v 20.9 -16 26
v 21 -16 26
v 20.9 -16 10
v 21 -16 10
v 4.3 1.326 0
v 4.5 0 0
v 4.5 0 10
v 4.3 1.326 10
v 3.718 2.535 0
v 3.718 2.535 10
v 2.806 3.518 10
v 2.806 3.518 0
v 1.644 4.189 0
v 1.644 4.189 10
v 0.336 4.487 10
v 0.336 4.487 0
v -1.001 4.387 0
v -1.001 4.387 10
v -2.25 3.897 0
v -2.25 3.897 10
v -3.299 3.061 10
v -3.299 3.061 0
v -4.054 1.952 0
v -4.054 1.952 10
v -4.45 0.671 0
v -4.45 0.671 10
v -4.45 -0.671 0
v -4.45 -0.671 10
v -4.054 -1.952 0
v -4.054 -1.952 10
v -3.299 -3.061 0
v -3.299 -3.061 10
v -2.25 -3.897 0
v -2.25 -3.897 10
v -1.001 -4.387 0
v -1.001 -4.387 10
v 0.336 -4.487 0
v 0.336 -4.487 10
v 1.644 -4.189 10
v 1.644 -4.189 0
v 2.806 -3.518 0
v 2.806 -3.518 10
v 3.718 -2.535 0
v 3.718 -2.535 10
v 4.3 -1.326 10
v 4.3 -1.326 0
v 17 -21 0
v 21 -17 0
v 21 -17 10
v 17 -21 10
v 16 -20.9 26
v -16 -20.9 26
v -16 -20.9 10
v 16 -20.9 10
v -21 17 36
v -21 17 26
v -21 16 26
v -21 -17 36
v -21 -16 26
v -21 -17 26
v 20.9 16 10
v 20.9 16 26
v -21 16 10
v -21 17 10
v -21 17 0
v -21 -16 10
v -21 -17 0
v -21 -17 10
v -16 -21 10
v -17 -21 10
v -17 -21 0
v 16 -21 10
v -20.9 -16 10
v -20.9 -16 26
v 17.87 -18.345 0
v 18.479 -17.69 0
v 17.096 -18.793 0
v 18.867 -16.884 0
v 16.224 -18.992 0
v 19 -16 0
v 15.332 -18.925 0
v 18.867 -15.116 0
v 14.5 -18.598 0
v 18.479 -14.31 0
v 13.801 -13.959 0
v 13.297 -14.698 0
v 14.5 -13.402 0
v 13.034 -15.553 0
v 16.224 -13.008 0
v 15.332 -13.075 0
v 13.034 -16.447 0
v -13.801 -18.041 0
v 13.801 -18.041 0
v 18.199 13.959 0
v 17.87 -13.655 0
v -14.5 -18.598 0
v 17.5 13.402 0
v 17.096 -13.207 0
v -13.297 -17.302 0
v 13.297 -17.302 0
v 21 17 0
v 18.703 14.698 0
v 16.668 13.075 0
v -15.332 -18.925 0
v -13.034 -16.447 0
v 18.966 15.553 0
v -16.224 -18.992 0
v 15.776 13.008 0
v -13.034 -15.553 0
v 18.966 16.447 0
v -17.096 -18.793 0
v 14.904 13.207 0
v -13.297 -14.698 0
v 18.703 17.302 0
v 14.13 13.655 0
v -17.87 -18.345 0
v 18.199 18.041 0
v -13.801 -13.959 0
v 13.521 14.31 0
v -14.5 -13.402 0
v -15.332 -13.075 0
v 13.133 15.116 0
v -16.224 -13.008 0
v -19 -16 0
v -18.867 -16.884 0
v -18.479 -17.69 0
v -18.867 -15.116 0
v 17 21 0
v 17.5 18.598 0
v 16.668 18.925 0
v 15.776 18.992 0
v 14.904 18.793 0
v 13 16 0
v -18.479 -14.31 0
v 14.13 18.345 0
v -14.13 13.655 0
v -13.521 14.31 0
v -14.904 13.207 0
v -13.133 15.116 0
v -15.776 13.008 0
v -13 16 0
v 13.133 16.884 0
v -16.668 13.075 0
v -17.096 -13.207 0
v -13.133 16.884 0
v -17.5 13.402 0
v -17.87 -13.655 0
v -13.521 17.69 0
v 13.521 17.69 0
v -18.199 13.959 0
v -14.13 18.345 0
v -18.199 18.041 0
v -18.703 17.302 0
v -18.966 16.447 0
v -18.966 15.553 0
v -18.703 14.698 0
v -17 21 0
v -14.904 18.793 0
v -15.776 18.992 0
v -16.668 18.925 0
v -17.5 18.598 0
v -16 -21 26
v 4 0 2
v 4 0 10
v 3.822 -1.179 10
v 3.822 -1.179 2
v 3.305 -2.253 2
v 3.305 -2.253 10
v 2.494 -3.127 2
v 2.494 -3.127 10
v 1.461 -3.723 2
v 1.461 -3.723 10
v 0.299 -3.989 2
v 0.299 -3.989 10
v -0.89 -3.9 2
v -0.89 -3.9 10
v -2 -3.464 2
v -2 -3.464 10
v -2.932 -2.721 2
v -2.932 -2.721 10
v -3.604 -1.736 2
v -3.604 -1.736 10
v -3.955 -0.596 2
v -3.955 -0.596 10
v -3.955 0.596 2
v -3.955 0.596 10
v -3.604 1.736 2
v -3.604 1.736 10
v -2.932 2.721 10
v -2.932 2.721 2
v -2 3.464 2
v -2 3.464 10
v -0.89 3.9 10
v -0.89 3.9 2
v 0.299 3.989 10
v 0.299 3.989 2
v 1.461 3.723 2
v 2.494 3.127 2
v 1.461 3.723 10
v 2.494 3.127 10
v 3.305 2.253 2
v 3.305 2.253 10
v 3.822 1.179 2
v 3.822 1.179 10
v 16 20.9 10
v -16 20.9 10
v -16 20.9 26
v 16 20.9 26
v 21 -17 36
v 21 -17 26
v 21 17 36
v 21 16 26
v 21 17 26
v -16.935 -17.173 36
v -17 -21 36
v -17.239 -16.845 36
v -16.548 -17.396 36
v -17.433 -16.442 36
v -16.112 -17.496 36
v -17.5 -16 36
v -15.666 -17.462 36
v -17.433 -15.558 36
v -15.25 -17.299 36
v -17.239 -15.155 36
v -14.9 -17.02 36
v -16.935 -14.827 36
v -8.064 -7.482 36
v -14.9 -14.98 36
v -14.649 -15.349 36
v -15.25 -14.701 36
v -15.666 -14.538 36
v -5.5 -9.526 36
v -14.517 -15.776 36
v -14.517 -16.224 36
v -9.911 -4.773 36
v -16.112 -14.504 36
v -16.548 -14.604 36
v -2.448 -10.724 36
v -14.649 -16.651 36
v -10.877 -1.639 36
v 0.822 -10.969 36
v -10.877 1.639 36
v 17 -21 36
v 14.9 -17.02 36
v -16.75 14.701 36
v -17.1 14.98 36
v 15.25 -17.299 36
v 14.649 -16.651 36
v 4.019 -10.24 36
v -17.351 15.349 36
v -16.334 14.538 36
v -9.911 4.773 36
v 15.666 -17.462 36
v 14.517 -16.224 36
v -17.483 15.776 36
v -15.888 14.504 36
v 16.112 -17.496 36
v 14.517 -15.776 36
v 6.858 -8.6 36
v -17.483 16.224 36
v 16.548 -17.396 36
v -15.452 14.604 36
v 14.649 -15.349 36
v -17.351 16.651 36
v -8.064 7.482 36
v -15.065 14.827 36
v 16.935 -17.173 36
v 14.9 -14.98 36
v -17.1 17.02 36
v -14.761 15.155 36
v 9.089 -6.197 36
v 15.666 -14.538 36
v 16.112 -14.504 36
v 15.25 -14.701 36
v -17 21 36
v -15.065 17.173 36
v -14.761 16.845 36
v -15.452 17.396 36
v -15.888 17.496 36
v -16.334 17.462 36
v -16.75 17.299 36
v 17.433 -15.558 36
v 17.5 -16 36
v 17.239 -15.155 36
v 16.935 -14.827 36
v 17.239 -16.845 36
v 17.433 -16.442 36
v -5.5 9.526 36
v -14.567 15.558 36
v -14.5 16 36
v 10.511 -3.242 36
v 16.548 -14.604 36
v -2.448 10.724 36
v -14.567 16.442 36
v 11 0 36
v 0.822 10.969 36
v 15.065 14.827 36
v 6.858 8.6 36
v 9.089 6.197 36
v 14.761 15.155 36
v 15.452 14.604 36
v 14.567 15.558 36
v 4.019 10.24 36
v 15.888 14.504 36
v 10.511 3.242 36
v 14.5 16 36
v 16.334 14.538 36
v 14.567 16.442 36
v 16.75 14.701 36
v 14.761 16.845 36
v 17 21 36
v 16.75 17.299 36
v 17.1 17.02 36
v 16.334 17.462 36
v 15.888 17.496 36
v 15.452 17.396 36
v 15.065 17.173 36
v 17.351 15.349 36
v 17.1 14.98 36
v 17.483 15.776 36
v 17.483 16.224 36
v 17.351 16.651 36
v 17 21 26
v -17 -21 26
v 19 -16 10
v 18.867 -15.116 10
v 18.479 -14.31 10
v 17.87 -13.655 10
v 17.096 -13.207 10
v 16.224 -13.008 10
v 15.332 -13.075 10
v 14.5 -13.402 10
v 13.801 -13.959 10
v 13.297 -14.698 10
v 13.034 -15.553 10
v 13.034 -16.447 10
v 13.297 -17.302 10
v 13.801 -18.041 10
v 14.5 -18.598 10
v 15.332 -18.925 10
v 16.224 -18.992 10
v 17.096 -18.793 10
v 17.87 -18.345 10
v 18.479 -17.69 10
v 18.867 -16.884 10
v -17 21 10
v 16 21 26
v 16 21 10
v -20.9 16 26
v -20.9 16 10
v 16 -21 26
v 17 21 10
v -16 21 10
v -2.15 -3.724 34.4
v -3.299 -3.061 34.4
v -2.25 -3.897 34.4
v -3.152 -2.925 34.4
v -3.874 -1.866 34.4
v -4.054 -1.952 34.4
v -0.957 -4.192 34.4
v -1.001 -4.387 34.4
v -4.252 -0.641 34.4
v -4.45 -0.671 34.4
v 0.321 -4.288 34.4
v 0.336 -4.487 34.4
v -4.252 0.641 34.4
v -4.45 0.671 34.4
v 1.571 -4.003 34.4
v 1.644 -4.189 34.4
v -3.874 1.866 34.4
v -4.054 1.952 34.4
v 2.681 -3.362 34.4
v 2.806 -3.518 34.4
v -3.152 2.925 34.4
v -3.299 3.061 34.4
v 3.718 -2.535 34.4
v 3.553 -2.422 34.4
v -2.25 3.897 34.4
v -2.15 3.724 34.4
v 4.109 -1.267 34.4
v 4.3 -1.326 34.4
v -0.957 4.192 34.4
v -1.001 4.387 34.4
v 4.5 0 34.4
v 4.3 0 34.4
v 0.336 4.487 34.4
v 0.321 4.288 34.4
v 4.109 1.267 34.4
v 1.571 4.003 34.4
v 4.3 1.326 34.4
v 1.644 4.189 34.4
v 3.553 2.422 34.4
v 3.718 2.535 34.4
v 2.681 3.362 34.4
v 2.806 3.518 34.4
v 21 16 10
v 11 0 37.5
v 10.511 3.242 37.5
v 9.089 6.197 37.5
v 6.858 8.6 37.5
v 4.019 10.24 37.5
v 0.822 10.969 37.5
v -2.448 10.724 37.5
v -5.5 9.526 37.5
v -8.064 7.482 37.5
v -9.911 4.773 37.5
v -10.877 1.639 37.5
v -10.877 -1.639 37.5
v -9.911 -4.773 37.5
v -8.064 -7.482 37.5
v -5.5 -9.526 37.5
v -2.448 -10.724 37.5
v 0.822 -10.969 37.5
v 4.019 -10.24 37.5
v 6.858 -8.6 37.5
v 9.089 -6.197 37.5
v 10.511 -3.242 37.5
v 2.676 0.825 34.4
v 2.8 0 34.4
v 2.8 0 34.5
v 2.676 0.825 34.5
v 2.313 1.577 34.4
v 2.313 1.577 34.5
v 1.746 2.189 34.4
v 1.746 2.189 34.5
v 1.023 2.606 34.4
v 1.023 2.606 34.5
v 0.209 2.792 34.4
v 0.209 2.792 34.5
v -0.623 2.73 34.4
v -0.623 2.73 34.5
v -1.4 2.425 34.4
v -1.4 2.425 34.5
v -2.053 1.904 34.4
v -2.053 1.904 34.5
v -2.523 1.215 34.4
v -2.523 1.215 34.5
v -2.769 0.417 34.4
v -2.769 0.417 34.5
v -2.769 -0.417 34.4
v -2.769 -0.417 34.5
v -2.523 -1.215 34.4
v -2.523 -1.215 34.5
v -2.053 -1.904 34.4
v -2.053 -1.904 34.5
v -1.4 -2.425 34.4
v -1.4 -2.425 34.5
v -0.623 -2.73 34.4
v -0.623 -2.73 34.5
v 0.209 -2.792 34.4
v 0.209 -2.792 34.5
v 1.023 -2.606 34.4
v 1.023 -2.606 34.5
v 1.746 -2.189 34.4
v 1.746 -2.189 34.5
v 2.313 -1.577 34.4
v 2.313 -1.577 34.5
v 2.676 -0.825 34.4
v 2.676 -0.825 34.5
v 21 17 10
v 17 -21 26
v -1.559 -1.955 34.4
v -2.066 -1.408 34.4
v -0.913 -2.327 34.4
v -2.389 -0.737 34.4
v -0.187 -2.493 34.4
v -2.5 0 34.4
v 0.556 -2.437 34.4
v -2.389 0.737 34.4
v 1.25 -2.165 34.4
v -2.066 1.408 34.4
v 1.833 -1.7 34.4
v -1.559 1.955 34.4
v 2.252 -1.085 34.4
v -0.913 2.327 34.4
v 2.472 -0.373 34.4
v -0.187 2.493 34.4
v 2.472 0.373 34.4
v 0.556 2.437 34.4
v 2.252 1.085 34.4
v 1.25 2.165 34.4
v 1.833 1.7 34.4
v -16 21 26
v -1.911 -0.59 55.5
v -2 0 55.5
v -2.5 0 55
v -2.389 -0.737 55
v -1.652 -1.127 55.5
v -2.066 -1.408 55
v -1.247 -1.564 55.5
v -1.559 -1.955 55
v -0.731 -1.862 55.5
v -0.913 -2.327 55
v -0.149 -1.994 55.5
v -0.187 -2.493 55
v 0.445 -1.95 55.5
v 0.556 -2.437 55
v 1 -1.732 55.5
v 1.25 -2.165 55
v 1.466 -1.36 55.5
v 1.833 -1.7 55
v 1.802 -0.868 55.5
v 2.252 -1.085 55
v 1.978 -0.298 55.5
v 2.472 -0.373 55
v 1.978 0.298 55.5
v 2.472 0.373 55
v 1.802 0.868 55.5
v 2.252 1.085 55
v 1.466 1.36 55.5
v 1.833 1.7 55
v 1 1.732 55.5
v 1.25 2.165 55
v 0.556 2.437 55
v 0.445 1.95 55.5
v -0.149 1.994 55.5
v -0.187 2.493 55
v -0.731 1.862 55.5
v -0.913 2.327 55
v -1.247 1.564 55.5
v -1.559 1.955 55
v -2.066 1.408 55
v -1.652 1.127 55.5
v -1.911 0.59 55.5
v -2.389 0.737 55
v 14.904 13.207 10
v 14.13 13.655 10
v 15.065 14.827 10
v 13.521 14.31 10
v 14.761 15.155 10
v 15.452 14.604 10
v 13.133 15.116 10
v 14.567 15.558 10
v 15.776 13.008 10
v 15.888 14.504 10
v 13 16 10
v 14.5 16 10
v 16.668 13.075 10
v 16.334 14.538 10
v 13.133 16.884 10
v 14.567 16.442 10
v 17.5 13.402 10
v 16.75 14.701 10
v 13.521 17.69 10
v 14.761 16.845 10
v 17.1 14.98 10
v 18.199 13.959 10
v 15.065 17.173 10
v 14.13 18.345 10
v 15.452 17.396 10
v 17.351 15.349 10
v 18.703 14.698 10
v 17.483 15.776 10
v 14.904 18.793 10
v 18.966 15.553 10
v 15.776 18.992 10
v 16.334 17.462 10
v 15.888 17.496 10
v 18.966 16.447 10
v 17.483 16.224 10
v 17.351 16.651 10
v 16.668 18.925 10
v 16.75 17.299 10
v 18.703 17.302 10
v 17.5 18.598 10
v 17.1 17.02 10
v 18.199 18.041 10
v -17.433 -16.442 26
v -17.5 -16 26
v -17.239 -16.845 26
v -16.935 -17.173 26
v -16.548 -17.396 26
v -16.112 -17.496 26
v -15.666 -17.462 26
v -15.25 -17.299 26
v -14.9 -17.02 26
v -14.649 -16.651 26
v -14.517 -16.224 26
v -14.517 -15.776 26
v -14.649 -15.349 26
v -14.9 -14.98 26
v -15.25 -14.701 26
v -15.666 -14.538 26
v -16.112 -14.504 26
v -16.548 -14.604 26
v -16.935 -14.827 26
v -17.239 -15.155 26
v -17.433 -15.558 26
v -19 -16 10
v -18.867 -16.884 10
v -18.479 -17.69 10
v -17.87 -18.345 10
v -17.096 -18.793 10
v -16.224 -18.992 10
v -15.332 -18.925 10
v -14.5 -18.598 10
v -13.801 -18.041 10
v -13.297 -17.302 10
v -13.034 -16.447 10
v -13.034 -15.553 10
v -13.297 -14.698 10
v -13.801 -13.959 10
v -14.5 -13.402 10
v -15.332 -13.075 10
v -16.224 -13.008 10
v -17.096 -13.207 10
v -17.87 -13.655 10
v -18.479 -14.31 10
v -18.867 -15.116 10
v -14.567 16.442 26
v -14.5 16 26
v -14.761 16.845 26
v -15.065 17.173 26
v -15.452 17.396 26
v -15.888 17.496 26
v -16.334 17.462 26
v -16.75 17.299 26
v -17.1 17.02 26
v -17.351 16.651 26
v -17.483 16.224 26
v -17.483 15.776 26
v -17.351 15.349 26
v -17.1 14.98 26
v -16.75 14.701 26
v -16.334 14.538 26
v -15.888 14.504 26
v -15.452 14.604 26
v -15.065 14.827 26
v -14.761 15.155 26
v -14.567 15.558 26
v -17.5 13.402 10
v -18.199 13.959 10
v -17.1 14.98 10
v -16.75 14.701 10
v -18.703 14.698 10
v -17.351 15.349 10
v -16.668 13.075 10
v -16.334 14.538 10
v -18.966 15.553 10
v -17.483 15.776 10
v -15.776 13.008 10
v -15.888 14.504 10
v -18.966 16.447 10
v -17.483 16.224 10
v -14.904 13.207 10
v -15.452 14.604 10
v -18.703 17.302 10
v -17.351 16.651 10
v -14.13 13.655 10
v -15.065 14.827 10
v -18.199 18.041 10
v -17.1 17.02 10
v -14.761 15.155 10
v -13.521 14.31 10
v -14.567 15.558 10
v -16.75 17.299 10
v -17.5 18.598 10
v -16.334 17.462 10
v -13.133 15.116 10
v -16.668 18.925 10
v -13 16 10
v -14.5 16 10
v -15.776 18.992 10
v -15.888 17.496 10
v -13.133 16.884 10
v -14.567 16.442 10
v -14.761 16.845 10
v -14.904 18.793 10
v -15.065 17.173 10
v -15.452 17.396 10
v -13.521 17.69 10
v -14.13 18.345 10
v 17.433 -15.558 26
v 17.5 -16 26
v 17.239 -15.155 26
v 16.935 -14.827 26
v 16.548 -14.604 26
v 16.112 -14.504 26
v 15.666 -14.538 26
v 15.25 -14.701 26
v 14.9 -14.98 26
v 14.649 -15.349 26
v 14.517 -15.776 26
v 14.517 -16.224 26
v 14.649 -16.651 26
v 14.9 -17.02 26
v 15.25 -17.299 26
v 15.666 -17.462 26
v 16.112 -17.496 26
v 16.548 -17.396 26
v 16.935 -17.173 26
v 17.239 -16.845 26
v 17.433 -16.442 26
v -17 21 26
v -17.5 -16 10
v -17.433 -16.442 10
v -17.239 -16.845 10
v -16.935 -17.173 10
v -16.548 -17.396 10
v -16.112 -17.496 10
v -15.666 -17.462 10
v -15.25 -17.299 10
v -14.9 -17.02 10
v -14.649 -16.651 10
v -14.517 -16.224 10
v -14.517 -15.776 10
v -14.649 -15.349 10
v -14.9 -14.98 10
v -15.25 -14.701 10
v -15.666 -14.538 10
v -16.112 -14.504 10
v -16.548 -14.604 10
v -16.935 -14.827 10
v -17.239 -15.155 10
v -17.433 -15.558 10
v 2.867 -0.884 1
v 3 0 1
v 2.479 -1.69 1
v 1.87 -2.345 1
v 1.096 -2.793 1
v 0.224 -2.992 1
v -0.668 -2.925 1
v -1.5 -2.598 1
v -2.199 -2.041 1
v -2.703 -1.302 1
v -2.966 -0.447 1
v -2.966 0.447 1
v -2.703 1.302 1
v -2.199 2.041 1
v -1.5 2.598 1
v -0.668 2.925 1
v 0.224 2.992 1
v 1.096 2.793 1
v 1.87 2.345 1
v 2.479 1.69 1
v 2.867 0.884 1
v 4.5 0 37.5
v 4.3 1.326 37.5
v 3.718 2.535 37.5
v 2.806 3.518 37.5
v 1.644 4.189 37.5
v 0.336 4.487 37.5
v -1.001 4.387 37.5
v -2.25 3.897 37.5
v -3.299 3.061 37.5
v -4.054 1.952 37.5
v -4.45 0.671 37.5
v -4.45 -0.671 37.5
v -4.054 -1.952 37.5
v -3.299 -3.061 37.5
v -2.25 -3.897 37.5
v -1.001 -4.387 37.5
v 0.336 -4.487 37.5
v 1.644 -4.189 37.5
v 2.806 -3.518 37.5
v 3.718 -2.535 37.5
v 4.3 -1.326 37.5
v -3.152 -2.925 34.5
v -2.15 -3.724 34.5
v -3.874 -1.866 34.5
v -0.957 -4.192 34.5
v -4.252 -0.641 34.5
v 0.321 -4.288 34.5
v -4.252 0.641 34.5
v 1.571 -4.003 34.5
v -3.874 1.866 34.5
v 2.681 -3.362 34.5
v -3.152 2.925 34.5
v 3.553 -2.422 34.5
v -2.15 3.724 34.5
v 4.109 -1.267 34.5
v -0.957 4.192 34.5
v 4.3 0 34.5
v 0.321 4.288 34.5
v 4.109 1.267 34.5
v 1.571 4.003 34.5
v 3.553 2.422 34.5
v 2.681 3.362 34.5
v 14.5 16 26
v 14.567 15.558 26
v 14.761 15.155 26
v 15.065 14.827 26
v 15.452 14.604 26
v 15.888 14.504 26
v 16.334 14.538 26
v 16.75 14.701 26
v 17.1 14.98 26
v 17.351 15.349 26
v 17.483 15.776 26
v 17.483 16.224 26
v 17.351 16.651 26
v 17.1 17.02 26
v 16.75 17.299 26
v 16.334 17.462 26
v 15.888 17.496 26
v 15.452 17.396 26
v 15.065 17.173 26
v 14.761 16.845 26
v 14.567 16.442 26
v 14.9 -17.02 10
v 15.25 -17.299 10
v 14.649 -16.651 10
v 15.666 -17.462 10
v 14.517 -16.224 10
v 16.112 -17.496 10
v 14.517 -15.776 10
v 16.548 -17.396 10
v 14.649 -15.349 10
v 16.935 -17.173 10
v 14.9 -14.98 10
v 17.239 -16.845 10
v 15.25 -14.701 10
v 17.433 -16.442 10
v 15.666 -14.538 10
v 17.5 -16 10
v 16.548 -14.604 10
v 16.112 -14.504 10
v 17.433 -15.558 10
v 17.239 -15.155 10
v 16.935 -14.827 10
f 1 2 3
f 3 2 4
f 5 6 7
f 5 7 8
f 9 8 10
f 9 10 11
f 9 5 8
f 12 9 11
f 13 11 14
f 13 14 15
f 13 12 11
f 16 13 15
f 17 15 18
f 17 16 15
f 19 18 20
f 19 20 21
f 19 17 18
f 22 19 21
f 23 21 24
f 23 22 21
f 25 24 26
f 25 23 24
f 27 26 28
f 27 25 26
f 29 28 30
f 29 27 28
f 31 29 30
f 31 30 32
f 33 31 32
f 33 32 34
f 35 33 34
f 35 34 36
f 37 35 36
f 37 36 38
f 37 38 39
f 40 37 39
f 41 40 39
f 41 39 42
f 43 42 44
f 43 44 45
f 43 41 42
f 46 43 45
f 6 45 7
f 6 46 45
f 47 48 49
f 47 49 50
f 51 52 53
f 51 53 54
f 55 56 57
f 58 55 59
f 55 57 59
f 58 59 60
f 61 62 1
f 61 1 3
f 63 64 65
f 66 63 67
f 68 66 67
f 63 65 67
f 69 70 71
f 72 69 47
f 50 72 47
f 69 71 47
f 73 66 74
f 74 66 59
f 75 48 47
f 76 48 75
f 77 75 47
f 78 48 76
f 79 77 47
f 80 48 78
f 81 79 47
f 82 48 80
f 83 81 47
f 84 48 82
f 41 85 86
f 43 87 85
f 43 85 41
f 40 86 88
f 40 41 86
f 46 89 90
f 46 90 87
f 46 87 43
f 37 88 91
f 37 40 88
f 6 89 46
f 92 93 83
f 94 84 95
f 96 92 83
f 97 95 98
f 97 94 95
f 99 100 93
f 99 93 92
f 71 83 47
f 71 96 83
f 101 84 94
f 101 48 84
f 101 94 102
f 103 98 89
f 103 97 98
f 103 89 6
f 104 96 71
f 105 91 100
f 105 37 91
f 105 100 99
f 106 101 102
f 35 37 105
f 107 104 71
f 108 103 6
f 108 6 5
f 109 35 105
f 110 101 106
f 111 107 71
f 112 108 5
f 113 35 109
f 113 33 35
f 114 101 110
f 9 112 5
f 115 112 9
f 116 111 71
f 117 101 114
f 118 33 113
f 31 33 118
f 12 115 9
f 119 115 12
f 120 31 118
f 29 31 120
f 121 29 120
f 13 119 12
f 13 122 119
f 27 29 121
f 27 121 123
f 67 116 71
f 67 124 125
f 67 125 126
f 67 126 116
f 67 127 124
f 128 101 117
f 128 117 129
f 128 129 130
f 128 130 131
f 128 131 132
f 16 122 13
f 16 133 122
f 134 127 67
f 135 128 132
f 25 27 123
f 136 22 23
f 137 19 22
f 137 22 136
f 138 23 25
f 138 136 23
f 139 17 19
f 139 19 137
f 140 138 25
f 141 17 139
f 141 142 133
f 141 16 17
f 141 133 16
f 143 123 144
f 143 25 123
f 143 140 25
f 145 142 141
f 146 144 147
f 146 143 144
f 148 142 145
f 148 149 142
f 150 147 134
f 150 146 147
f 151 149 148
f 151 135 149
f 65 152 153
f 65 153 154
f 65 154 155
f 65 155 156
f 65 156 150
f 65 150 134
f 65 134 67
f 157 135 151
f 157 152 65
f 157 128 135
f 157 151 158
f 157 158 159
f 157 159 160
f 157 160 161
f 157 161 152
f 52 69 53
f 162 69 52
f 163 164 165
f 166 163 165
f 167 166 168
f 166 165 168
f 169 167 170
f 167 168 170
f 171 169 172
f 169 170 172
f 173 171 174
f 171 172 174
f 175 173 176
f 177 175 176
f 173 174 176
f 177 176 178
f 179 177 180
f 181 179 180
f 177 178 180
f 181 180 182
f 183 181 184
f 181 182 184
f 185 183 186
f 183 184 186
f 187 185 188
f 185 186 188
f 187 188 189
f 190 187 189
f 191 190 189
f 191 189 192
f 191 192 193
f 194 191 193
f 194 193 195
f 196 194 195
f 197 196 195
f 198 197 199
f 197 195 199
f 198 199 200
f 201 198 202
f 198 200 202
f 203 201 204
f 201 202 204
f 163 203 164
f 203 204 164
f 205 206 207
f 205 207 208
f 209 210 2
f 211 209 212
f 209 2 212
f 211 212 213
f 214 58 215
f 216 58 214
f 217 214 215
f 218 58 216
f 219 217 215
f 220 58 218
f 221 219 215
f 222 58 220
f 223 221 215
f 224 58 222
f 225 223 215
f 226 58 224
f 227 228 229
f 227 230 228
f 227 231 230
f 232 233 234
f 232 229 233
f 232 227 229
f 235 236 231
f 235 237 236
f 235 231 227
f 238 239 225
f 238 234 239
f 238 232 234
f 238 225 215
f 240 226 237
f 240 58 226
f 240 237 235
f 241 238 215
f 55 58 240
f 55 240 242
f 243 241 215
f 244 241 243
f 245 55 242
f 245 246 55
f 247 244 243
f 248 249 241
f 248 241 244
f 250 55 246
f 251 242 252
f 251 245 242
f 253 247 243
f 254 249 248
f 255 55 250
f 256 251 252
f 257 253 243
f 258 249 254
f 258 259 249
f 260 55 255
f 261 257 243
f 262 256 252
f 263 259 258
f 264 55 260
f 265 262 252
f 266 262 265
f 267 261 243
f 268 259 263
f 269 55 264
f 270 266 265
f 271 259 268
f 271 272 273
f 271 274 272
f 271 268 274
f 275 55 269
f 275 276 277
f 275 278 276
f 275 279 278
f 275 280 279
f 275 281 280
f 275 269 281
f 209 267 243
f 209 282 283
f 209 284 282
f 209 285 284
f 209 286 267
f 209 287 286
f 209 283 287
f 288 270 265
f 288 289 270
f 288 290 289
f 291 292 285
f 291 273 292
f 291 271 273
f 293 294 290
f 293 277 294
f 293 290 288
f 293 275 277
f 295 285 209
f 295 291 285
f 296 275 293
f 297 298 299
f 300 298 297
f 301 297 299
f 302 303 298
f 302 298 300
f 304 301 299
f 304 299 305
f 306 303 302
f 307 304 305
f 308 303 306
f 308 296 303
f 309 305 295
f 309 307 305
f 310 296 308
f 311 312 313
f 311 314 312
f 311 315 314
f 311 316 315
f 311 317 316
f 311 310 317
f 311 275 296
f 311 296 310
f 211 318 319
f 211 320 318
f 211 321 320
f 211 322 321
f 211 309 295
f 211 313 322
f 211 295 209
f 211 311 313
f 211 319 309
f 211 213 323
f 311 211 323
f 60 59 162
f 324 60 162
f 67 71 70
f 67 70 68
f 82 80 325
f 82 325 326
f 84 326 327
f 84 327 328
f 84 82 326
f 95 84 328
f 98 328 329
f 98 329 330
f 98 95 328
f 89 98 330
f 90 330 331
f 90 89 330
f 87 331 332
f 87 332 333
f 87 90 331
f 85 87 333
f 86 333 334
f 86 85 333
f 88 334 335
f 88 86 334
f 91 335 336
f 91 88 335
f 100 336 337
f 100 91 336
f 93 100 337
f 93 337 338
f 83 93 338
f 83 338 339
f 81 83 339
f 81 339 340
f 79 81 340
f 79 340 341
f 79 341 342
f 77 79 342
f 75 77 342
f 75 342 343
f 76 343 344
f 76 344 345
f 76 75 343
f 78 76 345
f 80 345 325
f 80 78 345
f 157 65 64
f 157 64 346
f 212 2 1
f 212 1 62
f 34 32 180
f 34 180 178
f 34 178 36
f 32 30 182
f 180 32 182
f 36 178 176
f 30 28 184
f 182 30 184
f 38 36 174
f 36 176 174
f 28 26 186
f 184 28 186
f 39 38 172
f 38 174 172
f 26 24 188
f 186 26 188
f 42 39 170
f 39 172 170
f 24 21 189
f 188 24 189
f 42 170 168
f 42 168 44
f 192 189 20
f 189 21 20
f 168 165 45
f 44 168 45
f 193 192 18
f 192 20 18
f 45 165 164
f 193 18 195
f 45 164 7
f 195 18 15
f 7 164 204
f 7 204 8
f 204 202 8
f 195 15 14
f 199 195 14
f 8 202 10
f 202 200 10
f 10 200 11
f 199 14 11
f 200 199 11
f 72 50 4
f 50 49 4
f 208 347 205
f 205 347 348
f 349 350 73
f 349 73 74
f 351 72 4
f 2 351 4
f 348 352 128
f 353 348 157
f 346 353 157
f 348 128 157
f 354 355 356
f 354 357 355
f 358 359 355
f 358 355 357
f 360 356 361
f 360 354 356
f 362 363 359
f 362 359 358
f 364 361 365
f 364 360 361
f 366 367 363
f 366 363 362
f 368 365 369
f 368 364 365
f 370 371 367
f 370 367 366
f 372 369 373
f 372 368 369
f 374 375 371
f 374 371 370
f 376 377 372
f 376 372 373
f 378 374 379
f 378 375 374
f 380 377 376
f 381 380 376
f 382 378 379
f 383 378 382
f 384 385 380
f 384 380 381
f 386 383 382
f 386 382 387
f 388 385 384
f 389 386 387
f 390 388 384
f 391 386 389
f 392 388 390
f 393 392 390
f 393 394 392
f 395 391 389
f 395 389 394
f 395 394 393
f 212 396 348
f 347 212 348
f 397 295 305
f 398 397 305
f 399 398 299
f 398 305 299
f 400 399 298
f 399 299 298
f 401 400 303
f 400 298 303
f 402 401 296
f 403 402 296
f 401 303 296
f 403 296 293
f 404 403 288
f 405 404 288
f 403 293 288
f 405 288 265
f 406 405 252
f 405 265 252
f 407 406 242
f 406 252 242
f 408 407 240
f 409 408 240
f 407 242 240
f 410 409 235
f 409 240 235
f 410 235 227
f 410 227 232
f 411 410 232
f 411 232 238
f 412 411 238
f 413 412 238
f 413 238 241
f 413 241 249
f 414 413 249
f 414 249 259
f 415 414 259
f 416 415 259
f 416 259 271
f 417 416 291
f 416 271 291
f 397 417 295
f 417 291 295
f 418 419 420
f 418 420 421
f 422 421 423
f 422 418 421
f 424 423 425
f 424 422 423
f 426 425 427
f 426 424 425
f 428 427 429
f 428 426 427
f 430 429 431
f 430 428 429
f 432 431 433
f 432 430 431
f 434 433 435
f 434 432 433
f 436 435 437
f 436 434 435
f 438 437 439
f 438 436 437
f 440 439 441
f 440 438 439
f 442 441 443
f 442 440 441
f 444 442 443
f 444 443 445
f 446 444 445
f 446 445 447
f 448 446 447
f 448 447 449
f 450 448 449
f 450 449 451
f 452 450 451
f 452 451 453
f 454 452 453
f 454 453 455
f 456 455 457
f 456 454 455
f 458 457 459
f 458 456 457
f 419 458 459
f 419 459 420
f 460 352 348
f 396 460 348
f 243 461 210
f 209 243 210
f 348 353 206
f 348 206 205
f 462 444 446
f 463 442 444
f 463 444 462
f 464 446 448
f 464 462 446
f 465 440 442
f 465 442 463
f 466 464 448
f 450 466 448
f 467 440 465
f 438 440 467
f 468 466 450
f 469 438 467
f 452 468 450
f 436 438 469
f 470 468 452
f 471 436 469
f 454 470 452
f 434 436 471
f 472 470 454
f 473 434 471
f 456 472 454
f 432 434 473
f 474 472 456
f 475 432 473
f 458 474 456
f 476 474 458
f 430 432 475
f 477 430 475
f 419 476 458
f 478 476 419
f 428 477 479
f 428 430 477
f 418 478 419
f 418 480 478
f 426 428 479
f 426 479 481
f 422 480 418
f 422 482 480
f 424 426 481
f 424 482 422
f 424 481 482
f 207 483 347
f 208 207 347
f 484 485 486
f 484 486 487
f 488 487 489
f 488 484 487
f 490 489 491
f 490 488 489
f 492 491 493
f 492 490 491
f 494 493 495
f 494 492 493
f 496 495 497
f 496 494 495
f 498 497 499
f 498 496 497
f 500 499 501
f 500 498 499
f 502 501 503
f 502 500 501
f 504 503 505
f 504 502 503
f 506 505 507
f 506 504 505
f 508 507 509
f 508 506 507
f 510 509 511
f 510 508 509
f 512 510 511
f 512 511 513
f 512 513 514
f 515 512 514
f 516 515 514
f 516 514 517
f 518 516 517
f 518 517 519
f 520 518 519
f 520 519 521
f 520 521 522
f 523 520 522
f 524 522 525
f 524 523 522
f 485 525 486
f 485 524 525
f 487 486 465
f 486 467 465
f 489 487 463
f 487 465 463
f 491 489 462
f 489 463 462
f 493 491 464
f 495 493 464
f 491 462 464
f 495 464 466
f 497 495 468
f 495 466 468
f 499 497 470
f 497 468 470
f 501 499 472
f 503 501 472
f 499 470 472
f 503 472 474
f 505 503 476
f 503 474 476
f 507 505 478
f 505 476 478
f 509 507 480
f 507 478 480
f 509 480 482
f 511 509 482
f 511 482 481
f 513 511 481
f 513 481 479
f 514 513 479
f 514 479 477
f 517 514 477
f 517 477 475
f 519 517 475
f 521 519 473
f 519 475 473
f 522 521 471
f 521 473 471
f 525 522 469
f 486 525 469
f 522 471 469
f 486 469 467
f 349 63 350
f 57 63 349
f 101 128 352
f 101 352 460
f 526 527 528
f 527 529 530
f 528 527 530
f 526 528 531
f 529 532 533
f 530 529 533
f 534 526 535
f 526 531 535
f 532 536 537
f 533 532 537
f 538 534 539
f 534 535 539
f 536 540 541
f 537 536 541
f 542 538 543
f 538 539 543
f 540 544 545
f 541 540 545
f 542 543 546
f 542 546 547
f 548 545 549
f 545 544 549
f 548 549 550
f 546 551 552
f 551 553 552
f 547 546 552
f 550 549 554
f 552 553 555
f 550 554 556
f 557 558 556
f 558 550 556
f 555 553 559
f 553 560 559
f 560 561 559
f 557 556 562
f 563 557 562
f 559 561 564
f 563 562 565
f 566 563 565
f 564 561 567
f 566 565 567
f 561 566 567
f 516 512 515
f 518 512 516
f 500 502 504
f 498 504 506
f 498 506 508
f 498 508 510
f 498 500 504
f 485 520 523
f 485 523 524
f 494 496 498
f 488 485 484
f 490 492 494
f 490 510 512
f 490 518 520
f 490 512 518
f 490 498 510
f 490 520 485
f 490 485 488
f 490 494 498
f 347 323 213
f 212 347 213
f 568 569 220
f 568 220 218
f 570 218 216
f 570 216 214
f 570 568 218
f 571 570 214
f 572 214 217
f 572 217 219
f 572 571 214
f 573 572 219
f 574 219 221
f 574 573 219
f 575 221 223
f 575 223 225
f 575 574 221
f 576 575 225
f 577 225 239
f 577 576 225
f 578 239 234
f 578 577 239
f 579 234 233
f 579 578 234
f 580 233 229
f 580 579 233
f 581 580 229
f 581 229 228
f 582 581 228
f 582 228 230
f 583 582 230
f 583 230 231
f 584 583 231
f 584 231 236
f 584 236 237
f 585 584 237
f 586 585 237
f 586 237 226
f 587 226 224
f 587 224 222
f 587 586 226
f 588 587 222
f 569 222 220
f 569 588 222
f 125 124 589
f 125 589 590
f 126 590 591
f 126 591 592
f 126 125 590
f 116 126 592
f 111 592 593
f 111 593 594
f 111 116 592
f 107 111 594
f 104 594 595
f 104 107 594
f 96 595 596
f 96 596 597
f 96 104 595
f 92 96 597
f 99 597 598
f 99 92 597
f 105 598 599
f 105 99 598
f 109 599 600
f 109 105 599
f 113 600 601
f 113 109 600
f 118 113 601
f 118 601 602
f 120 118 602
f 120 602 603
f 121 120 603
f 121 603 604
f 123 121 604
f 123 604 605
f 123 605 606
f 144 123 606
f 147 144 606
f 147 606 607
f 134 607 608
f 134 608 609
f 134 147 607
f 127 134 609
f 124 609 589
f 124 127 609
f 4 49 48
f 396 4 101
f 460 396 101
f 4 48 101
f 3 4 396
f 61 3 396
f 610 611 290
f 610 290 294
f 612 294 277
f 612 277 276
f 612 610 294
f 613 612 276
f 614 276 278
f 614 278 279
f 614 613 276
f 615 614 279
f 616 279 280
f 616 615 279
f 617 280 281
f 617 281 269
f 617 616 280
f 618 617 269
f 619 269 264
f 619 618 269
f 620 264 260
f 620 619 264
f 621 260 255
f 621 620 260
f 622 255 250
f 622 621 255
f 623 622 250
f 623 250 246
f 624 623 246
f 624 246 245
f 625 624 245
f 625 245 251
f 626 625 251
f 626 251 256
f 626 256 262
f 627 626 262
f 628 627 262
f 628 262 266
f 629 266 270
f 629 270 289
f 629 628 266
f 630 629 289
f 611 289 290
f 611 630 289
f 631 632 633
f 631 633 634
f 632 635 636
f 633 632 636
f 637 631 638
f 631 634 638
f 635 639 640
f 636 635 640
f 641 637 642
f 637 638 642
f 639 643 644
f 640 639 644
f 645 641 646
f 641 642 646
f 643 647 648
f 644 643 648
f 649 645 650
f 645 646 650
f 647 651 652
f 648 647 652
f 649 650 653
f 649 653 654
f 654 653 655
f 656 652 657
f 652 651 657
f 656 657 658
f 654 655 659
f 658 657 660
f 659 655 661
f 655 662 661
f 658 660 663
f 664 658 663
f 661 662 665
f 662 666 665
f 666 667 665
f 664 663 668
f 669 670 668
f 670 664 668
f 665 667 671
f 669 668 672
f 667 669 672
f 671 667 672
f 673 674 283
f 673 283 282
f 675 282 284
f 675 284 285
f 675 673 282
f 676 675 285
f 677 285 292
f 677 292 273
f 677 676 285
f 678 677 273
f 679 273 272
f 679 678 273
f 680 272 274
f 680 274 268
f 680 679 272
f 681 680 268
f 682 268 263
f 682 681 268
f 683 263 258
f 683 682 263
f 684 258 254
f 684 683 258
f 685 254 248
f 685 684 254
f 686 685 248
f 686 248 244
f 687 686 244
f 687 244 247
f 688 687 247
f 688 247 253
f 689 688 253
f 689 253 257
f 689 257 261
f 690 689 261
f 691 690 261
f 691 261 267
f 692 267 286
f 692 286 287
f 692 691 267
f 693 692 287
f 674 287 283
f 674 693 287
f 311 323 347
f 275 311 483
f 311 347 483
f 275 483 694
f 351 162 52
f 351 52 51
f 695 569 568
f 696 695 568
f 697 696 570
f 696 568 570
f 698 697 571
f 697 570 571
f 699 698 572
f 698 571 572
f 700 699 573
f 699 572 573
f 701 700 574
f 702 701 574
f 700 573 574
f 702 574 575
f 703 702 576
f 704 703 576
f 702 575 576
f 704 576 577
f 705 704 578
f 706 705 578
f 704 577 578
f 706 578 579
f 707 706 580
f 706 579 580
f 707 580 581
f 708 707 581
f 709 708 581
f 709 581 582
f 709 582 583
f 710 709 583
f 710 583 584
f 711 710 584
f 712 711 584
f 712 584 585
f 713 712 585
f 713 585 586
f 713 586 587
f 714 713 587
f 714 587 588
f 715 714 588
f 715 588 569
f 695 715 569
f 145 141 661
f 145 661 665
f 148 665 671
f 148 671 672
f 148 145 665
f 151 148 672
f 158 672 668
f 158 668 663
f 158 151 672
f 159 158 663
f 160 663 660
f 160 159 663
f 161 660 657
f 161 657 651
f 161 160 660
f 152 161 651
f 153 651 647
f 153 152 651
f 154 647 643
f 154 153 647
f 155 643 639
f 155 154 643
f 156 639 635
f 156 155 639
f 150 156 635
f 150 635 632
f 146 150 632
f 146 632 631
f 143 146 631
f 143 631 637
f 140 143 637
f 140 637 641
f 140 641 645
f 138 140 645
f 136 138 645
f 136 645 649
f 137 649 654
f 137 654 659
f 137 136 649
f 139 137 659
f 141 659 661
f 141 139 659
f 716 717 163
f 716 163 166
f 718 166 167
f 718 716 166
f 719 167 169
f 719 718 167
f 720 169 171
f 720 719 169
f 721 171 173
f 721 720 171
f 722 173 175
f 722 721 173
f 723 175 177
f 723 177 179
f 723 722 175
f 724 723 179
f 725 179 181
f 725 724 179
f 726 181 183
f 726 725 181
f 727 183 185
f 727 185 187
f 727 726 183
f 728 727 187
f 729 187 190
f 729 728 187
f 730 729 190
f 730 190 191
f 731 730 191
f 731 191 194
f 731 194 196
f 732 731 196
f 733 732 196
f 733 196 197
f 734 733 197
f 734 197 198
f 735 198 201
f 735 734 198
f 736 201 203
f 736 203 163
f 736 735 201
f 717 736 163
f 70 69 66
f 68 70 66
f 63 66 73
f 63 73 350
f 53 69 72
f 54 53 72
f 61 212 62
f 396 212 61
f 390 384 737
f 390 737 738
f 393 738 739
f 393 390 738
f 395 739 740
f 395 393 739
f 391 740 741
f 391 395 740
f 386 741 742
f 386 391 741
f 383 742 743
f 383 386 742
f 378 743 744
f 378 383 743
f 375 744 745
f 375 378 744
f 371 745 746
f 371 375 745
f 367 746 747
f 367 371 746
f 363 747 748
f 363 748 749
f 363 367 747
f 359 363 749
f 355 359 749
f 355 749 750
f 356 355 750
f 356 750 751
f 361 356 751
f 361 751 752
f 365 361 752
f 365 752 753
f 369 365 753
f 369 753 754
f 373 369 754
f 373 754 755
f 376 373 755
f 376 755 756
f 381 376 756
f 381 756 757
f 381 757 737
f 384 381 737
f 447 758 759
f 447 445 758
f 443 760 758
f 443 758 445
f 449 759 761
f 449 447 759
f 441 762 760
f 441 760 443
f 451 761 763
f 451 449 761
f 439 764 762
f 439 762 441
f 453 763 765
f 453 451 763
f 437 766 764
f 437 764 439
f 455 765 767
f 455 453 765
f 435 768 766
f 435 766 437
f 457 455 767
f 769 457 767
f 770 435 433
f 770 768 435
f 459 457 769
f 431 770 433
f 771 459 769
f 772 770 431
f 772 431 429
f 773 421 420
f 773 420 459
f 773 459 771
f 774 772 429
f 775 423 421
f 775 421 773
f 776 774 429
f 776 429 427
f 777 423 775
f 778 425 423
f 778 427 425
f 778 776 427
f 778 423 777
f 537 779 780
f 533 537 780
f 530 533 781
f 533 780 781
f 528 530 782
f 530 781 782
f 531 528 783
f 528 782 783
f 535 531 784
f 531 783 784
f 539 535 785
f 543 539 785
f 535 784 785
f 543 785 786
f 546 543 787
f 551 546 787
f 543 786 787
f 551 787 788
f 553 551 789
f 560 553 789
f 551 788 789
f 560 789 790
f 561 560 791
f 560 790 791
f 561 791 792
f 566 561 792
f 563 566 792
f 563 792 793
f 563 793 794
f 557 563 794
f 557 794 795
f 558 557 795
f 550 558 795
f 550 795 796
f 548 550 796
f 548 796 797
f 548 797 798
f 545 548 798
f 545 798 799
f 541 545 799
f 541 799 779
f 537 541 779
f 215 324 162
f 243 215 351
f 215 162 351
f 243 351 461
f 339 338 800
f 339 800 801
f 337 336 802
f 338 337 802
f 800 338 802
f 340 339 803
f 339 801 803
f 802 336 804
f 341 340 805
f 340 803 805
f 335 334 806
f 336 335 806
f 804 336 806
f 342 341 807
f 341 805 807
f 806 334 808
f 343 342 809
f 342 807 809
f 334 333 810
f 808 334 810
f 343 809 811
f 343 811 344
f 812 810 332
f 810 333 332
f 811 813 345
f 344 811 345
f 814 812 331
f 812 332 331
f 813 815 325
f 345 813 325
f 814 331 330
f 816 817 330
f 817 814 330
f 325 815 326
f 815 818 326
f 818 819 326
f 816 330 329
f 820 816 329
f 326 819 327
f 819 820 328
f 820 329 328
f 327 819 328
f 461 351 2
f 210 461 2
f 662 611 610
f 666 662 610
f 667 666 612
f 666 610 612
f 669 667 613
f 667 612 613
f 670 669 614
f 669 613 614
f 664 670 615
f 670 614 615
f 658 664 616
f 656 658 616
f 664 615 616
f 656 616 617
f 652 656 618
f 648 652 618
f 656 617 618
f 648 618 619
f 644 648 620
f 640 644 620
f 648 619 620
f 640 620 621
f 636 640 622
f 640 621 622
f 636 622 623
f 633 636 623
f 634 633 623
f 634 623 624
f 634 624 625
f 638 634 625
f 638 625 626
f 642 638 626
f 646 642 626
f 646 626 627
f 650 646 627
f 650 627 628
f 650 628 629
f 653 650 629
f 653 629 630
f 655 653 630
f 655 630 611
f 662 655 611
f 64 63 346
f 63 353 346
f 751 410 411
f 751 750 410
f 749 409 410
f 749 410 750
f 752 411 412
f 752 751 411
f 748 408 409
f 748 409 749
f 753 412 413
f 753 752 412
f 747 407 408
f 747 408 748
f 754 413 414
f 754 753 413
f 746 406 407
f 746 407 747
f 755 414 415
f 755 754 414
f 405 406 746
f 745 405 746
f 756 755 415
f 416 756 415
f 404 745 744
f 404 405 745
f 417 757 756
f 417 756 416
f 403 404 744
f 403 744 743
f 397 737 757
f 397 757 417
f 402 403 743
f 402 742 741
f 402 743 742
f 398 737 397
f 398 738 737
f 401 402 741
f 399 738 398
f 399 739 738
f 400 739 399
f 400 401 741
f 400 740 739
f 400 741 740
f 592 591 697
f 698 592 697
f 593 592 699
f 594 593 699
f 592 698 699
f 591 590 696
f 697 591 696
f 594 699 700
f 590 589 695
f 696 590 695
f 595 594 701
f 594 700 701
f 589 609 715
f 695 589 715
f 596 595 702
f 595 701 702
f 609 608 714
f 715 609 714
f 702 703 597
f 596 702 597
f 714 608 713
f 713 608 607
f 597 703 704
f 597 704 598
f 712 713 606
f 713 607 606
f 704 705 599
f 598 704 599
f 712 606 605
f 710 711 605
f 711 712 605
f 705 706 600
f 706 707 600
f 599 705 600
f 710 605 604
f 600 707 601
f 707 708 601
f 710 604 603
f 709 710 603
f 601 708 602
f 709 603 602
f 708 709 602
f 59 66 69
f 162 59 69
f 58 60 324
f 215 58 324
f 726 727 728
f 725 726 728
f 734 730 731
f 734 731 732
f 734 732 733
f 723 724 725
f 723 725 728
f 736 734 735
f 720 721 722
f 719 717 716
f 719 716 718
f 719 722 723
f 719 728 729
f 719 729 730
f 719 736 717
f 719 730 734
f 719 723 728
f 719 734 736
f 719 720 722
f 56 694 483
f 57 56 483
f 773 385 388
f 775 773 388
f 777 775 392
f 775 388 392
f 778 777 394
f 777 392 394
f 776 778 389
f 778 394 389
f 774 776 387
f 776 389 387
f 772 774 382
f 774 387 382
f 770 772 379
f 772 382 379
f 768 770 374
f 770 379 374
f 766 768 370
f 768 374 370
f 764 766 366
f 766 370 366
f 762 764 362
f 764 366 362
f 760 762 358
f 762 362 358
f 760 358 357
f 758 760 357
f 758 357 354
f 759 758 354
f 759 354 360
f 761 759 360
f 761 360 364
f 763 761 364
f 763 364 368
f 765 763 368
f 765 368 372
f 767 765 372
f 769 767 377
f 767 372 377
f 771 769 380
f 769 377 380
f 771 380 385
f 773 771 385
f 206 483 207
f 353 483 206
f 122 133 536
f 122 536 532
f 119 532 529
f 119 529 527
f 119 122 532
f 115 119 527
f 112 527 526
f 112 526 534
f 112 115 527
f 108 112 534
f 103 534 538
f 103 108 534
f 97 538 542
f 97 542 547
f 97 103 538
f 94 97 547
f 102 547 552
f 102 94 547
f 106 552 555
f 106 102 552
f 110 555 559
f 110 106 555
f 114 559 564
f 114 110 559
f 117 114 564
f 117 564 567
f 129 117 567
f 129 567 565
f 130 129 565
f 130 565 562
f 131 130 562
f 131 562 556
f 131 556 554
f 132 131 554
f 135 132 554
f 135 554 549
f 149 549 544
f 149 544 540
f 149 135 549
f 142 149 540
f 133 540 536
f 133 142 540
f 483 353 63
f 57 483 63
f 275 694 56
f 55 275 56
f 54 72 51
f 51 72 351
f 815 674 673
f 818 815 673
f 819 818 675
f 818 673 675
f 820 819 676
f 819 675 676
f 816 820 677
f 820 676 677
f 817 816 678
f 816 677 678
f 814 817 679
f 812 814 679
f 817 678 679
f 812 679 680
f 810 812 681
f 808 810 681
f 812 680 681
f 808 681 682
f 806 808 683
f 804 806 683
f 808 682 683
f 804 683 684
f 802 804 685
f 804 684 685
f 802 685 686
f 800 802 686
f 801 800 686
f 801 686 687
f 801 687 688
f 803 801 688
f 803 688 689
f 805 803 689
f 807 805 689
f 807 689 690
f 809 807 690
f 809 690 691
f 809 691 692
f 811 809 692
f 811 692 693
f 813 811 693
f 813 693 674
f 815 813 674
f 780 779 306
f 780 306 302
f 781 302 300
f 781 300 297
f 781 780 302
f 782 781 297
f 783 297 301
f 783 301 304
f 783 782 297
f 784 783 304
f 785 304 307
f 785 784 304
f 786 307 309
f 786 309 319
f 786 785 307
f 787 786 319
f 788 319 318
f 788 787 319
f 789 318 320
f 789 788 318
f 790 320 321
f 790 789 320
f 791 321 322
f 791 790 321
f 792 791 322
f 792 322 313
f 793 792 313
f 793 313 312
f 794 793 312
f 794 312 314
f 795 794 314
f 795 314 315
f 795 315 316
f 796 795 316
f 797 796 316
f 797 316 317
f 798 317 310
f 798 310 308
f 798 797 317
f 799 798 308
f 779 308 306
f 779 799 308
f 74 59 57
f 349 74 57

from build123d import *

# Parameters (mm, degrees)
SKETCH_1_R          = 4.5
SKETCH_1_R_2        = 3
EXTRUDE_1_DEPTH     = 10
EXTRUDE_2_DEPTH     = 16
SKETCH_3_R          = 1.5
EXTRUDE_3_DEPTH     = 10
SKETCH_5_W          = 16
SKETCH_5_H          = 32
CUT_EXTRUDE_1_DEPTH = 0.1
SKETCH_6_W          = 32
SKETCH_6_H          = 16
CUT_EXTRUDE_2_DEPTH = 0.1
SKETCH_7_W          = 16
SKETCH_7_H          = 32
CUT_EXTRUDE_3_DEPTH = 0.1
SKETCH_8_W          = 32
SKETCH_8_H          = 16
CUT_EXTRUDE_4_DEPTH = 0.1
SKETCH_9_R          = 1.5
CUT_EXTRUDE_5_DEPTH = 40.471508712
SKETCH_10_R         = 11
EXTRUDE_4_DEPTH     = 1.5
CUT_EXTRUDE_START   = -3
SKETCH_11_R         = 4.5
CUT_EXTRUDE_6_DEPTH = 3
SKETCH_12_R         = 4
EXTRUDE_5_DEPTH     = 9
CHAMFER_1_SIZE      = 1
SKETCH_13_R         = 2.5
EXTRUDE_6_DEPTH     = 21
CUT_EXTRUDE_START_2 = -0.1
SKETCH_14_R         = 2.8
SKETCH_14_R_2       = 2.5
CUT_EXTRUDE_7_DEPTH = 0.1
SKETCH_15_R         = 4.5
SKETCH_15_R_2       = 4.3
CUT_EXTRUDE_8_DEPTH = 0.1
CHAMFER_2_SIZE      = 0.5


with BuildPart() as part:
    # 草图1 → 凸台-拉伸1 (new body)
    with BuildSketch(Plane.XY):
        Polygon((-21, 17), (-17, 21), (17, 21), (21, 17), (21, -17), (17, -21), (-17, -21), (-21, -17), align=None)
        Circle(SKETCH_1_R, mode=Mode.SUBTRACT)
        with Locations((-16, 16)):
            Circle(SKETCH_1_R_2, mode=Mode.SUBTRACT)
        with Locations(Location((16, 16, 0), (0, 0, 180))):
            Circle(SKETCH_1_R_2, mode=Mode.SUBTRACT)
        with Locations((16, -16)):
            Circle(SKETCH_1_R_2, mode=Mode.SUBTRACT)
        with Locations(Location((-16, -16, 0), (0, 0, 180))):
            Circle(SKETCH_1_R_2, mode=Mode.SUBTRACT)
    extrude(amount=EXTRUDE_1_DEPTH)

    # 草图2 → 凸台-拉伸2 (add)
    with BuildSketch(Plane.XY.offset(10)):
        Polygon((16, 21), (-16, 21), (-21, 16), (-21, -16), (-16, -21), (16, -21), (21, -16), (21, 16), align=None)
    extrude(amount=EXTRUDE_2_DEPTH)

    # 草图3 → 凸台-拉伸3 (add)
    with BuildSketch(Plane.XY.offset(26)):
        Polygon((-17, 21), (-21, 17), (-21, 16), (-21, -16), (-21, -17), (-17, -21), (-16, -21), (16, -21), (17, -21), (21, -17), (21, -16), (21, 16), (21, 17), (17, 21), (16, 21), (-16, 21), align=None)
        with Locations((-16, 16)):
            Circle(SKETCH_3_R, mode=Mode.SUBTRACT)
        with Locations(Location((16, 16, 0), (0, 0, 180))):
            Circle(SKETCH_3_R, mode=Mode.SUBTRACT)
        with Locations((16, -16)):
            Circle(SKETCH_3_R, mode=Mode.SUBTRACT)
        with Locations(Location((-16, -16, 0), (0, 0, 180))):
            Circle(SKETCH_3_R, mode=Mode.SUBTRACT)
    extrude(amount=EXTRUDE_3_DEPTH)

    # 草图5 → 切除-拉伸1 (cut)
    with BuildSketch(Plane.ZY.offset(21)):
        with Locations((18, 0)):
            Rectangle(SKETCH_5_W, SKETCH_5_H)
    extrude(amount=-CUT_EXTRUDE_1_DEPTH, mode=Mode.SUBTRACT)

    # 草图6 → 切除-拉伸2 (cut)
    with BuildSketch(Plane(origin=(0, 21, 0), x_dir=(1, 0, 0), z_dir=(0, 1, 0))):
        with Locations((0, -18)):
            Rectangle(SKETCH_6_W, SKETCH_6_H)
    extrude(amount=-CUT_EXTRUDE_2_DEPTH, mode=Mode.SUBTRACT)

    # 草图7 → 切除-拉伸3 (cut)
    with BuildSketch(Plane(origin=(21, 0, 0), x_dir=(0, 0, -1), z_dir=(1, 0, 0))):
        with Locations((-18, 0)):
            Rectangle(SKETCH_7_W, SKETCH_7_H)
    extrude(amount=-CUT_EXTRUDE_3_DEPTH, mode=Mode.SUBTRACT)

    # 草图8 → 切除-拉伸4 (cut)
    with BuildSketch(Plane.XZ.offset(21)):
        with Locations((0, 18)):
            Rectangle(SKETCH_8_W, SKETCH_8_H)
    extrude(amount=-CUT_EXTRUDE_4_DEPTH, mode=Mode.SUBTRACT)

    # 草图9 → 切除-拉伸5 (cut, through all)
    with BuildSketch(Plane.XY.offset(26)):
        with Locations(Location((-16, -16, 0), (0, 0, 180))):
            Circle(SKETCH_9_R)
        with Locations((-16, 16)):
            Circle(SKETCH_9_R)
        with Locations(Location((16, 16, 0), (0, 0, 180))):
            Circle(SKETCH_9_R)
        with Locations((16, -16)):
            Circle(SKETCH_9_R)
    extrude(amount=-CUT_EXTRUDE_5_DEPTH, mode=Mode.SUBTRACT)

    # 草图10 → 凸台-拉伸4 (add)
    with BuildSketch(Plane.XY.offset(36)):
        Circle(SKETCH_10_R)
    extrude(amount=EXTRUDE_4_DEPTH)

    # 草图11 → 切除-拉伸6 (cut)
    with BuildSketch(Plane.XY.offset(37.5).offset(CUT_EXTRUDE_START)):
        Circle(SKETCH_11_R)
    extrude(amount=CUT_EXTRUDE_6_DEPTH, mode=Mode.SUBTRACT)

    # 草图12 → 凸台-拉伸5 (add)
    with BuildSketch(Plane(origin=(0, 0, 10), x_dir=(-1, 0, 0), z_dir=(0, 0, -1))):
        with Locations(Location((0, 0, 0), (0, 0, 180))):
            Circle(SKETCH_12_R)
    extrude(amount=EXTRUDE_5_DEPTH)

    # 倒角1
    chamfer_1_edges = [part.edges().sort_by_distance(p)[0] for p in [
        (-4, 0, 1),
    ]]
    chamfer(chamfer_1_edges, length=CHAMFER_1_SIZE)

    # 草图13 → 凸台-拉伸6 (add)
    with BuildSketch(Plane.XY.offset(34.5)):
        with Locations(Location((0, 0, 0), (0, 0, 180))):
            Circle(SKETCH_13_R)
    extrude(amount=EXTRUDE_6_DEPTH)

    # 草图14 → 切除-拉伸7 (cut)
    with BuildSketch(Plane.XY.offset(34.5).offset(CUT_EXTRUDE_START_2)):
        Circle(SKETCH_14_R)
        with Locations(Location((0, 0, 0), (0, 0, 180))):
            Circle(SKETCH_14_R_2, mode=Mode.SUBTRACT)
    extrude(amount=CUT_EXTRUDE_7_DEPTH, mode=Mode.SUBTRACT)

    # 草图15 → 切除-拉伸8 (cut)
    with BuildSketch(Plane.XY.offset(34.5).offset(CUT_EXTRUDE_START_2)):
        Circle(SKETCH_15_R)
        Circle(SKETCH_15_R_2, mode=Mode.SUBTRACT)
    extrude(amount=CUT_EXTRUDE_8_DEPTH, mode=Mode.SUBTRACT)

    # 倒角2
    chamfer_2_edges = [part.edges().sort_by_distance(p)[0] for p in [
        (2.5, 0, 55.5),
    ]]
    chamfer(chamfer_2_edges, length=CHAMFER_2_SIZE)


solid = part.part
